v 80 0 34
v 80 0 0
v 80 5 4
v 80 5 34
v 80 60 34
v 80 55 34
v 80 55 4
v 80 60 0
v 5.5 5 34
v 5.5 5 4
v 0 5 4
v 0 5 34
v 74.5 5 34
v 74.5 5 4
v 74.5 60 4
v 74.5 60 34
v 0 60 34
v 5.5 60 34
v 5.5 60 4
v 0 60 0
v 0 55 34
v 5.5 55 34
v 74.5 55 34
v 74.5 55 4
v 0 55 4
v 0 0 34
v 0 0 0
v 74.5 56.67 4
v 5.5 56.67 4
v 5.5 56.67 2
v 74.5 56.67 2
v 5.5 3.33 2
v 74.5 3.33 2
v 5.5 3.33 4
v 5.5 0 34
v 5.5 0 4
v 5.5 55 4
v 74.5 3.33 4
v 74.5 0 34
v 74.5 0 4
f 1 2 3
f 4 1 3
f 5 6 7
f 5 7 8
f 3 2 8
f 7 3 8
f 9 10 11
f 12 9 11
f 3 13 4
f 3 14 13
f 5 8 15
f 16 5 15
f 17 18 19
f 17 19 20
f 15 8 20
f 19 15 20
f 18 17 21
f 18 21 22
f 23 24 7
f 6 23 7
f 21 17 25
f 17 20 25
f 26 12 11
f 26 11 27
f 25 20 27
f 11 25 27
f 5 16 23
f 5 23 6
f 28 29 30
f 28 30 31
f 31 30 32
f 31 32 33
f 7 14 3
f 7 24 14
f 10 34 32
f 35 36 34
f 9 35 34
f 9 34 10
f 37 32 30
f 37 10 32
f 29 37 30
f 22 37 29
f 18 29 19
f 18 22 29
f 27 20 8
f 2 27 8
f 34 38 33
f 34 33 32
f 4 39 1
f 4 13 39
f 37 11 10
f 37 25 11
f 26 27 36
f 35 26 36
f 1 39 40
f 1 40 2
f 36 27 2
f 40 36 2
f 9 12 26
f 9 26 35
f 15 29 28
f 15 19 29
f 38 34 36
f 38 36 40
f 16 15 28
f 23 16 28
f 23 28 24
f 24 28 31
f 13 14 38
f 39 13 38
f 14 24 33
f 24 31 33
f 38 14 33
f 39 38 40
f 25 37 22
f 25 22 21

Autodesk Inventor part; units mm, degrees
ref_plane "YZ Plane" through (0, 0, 0) normal (1, 0, 0) x (0, 1, 0)
ref_plane "XZ Plane" through (0, 0, 0) normal (0, 1, 0) x (-1, 0, 0)
ref_plane "XY Plane" through (0, 0, 0) normal (0, 0, 1) x (1, 0, 0)
sketch "Эскиз1" plane through (0, 0, 0) normal (0, 0, 1) x (1, 0, 0)
  line L0 (0, 0) -> (80, 0)
  line L1 (80, 0) -> (80, 60)
  line L2 (80, 60) -> (0, 60)
  line L3 (0, 60) -> (0, 0)
  dimension "d0" = 60
  dimension "d1" = 80
extrude "Выдавливание1" add sketch "Эскиз1" along normal blind 4
ref_plane "РабПлоскость1" through (0, 0, 4) normal (0, 0, 1) x (1, 0, 0)
sketch "Эскиз3" plane through (0, 0, 4) normal (0, 0, 1) x (1, 0, 0)
  line L0 (5.5, 56.67) -> (74.5, 56.67)
  line L1 (74.5, 56.67) -> (74.5, 3.33)
  line L2 (74.5, 3.33) -> (5.5, 3.33)
  line L3 (5.5, 3.33) -> (5.5, 56.67)
  line L4 (80, 60) -> (0, 60) projected
  line L5 (80, 0) -> (80, 60) projected
  line L6 (0, 0) -> (80, 0) projected
  dimension "d5" = 69
  dimension "d6" = 53.34
  dimension "d7" = 3.33
  dimension "d8" = 5.5
  dimension "d11" = 60
  dimension "d12" = 80
extrude "Выдавливание2" cut sketch "Эскиз3" against normal blind 2
sketch "Эскиз4" plane through (0, 0, 4) normal (0, 0, 1) x (1, 0, 0)
  line L0 (80, 60) -> (0, 60) projected
  line L1 (0, 60) -> (0, 0) projected
  line L2 (5.5, 56.67) -> (74.5, 56.67) projected
  line L3 (5.5, 3.33) -> (5.5, 56.67) projected
  line L4 (80, 0) -> (80, 60) projected
  line L5 (74.5, 56.67) -> (74.5, 3.33) projected
  line L6 (74.5, 3.33) -> (5.5, 3.33) projected
  line L7 (0, 0) -> (80, 0) projected
  line L8 (5.5, 3.33) -> (5.5, 56.67) projected
  line L9 (0, 60) -> (5.5, 60)
  line L10 (5.5, 60) -> (5.5, 55)
  line L11 (5.5, 55) -> (0, 55)
  line L12 (0, 55) -> (0, 60)
  line L13 (80, 60) -> (0, 60) projected
  line L14 (74.5, 56.67) -> (74.5, 3.33) projected
  line L15 (80, 60) -> (74.5, 60)
  line L16 (74.5, 60) -> (74.5, 55)
  line L17 (74.5, 55) -> (80, 55)
  line L18 (80, 55) -> (80, 60)
  line L19 (80, 0) -> (74.5, 0)
  line L20 (74.5, 0) -> (74.5, 5)
  line L21 (74.5, 5) -> (80, 5)
  line L22 (80, 5) -> (80, 0)
  line L23 (0, 0) -> (5.5, 0)
  line L24 (5.5, 0) -> (5.5, 5)
  line L25 (5.5, 5) -> (0, 5)
  line L26 (0, 5) -> (0, 0)
  dimension "d13" = 5
  dimension "d14" = 5
  dimension "d15" = 5
extrude "Выдавливание3" add sketch "Эскиз4" along normal blind 30 contours L4 L17 L5 L16 L0 | L10 L3 L11 L1 L0 | L4 L7 L20 L5 L21 | L25 L3 L24 L7 L1
equation "\"d7\" = -0.5 * d6 + 0.5 * d11"
equation "\"d8\" = -0.5 * d5 + 0.5 * d12"
properties part number "Каркас для плат"
